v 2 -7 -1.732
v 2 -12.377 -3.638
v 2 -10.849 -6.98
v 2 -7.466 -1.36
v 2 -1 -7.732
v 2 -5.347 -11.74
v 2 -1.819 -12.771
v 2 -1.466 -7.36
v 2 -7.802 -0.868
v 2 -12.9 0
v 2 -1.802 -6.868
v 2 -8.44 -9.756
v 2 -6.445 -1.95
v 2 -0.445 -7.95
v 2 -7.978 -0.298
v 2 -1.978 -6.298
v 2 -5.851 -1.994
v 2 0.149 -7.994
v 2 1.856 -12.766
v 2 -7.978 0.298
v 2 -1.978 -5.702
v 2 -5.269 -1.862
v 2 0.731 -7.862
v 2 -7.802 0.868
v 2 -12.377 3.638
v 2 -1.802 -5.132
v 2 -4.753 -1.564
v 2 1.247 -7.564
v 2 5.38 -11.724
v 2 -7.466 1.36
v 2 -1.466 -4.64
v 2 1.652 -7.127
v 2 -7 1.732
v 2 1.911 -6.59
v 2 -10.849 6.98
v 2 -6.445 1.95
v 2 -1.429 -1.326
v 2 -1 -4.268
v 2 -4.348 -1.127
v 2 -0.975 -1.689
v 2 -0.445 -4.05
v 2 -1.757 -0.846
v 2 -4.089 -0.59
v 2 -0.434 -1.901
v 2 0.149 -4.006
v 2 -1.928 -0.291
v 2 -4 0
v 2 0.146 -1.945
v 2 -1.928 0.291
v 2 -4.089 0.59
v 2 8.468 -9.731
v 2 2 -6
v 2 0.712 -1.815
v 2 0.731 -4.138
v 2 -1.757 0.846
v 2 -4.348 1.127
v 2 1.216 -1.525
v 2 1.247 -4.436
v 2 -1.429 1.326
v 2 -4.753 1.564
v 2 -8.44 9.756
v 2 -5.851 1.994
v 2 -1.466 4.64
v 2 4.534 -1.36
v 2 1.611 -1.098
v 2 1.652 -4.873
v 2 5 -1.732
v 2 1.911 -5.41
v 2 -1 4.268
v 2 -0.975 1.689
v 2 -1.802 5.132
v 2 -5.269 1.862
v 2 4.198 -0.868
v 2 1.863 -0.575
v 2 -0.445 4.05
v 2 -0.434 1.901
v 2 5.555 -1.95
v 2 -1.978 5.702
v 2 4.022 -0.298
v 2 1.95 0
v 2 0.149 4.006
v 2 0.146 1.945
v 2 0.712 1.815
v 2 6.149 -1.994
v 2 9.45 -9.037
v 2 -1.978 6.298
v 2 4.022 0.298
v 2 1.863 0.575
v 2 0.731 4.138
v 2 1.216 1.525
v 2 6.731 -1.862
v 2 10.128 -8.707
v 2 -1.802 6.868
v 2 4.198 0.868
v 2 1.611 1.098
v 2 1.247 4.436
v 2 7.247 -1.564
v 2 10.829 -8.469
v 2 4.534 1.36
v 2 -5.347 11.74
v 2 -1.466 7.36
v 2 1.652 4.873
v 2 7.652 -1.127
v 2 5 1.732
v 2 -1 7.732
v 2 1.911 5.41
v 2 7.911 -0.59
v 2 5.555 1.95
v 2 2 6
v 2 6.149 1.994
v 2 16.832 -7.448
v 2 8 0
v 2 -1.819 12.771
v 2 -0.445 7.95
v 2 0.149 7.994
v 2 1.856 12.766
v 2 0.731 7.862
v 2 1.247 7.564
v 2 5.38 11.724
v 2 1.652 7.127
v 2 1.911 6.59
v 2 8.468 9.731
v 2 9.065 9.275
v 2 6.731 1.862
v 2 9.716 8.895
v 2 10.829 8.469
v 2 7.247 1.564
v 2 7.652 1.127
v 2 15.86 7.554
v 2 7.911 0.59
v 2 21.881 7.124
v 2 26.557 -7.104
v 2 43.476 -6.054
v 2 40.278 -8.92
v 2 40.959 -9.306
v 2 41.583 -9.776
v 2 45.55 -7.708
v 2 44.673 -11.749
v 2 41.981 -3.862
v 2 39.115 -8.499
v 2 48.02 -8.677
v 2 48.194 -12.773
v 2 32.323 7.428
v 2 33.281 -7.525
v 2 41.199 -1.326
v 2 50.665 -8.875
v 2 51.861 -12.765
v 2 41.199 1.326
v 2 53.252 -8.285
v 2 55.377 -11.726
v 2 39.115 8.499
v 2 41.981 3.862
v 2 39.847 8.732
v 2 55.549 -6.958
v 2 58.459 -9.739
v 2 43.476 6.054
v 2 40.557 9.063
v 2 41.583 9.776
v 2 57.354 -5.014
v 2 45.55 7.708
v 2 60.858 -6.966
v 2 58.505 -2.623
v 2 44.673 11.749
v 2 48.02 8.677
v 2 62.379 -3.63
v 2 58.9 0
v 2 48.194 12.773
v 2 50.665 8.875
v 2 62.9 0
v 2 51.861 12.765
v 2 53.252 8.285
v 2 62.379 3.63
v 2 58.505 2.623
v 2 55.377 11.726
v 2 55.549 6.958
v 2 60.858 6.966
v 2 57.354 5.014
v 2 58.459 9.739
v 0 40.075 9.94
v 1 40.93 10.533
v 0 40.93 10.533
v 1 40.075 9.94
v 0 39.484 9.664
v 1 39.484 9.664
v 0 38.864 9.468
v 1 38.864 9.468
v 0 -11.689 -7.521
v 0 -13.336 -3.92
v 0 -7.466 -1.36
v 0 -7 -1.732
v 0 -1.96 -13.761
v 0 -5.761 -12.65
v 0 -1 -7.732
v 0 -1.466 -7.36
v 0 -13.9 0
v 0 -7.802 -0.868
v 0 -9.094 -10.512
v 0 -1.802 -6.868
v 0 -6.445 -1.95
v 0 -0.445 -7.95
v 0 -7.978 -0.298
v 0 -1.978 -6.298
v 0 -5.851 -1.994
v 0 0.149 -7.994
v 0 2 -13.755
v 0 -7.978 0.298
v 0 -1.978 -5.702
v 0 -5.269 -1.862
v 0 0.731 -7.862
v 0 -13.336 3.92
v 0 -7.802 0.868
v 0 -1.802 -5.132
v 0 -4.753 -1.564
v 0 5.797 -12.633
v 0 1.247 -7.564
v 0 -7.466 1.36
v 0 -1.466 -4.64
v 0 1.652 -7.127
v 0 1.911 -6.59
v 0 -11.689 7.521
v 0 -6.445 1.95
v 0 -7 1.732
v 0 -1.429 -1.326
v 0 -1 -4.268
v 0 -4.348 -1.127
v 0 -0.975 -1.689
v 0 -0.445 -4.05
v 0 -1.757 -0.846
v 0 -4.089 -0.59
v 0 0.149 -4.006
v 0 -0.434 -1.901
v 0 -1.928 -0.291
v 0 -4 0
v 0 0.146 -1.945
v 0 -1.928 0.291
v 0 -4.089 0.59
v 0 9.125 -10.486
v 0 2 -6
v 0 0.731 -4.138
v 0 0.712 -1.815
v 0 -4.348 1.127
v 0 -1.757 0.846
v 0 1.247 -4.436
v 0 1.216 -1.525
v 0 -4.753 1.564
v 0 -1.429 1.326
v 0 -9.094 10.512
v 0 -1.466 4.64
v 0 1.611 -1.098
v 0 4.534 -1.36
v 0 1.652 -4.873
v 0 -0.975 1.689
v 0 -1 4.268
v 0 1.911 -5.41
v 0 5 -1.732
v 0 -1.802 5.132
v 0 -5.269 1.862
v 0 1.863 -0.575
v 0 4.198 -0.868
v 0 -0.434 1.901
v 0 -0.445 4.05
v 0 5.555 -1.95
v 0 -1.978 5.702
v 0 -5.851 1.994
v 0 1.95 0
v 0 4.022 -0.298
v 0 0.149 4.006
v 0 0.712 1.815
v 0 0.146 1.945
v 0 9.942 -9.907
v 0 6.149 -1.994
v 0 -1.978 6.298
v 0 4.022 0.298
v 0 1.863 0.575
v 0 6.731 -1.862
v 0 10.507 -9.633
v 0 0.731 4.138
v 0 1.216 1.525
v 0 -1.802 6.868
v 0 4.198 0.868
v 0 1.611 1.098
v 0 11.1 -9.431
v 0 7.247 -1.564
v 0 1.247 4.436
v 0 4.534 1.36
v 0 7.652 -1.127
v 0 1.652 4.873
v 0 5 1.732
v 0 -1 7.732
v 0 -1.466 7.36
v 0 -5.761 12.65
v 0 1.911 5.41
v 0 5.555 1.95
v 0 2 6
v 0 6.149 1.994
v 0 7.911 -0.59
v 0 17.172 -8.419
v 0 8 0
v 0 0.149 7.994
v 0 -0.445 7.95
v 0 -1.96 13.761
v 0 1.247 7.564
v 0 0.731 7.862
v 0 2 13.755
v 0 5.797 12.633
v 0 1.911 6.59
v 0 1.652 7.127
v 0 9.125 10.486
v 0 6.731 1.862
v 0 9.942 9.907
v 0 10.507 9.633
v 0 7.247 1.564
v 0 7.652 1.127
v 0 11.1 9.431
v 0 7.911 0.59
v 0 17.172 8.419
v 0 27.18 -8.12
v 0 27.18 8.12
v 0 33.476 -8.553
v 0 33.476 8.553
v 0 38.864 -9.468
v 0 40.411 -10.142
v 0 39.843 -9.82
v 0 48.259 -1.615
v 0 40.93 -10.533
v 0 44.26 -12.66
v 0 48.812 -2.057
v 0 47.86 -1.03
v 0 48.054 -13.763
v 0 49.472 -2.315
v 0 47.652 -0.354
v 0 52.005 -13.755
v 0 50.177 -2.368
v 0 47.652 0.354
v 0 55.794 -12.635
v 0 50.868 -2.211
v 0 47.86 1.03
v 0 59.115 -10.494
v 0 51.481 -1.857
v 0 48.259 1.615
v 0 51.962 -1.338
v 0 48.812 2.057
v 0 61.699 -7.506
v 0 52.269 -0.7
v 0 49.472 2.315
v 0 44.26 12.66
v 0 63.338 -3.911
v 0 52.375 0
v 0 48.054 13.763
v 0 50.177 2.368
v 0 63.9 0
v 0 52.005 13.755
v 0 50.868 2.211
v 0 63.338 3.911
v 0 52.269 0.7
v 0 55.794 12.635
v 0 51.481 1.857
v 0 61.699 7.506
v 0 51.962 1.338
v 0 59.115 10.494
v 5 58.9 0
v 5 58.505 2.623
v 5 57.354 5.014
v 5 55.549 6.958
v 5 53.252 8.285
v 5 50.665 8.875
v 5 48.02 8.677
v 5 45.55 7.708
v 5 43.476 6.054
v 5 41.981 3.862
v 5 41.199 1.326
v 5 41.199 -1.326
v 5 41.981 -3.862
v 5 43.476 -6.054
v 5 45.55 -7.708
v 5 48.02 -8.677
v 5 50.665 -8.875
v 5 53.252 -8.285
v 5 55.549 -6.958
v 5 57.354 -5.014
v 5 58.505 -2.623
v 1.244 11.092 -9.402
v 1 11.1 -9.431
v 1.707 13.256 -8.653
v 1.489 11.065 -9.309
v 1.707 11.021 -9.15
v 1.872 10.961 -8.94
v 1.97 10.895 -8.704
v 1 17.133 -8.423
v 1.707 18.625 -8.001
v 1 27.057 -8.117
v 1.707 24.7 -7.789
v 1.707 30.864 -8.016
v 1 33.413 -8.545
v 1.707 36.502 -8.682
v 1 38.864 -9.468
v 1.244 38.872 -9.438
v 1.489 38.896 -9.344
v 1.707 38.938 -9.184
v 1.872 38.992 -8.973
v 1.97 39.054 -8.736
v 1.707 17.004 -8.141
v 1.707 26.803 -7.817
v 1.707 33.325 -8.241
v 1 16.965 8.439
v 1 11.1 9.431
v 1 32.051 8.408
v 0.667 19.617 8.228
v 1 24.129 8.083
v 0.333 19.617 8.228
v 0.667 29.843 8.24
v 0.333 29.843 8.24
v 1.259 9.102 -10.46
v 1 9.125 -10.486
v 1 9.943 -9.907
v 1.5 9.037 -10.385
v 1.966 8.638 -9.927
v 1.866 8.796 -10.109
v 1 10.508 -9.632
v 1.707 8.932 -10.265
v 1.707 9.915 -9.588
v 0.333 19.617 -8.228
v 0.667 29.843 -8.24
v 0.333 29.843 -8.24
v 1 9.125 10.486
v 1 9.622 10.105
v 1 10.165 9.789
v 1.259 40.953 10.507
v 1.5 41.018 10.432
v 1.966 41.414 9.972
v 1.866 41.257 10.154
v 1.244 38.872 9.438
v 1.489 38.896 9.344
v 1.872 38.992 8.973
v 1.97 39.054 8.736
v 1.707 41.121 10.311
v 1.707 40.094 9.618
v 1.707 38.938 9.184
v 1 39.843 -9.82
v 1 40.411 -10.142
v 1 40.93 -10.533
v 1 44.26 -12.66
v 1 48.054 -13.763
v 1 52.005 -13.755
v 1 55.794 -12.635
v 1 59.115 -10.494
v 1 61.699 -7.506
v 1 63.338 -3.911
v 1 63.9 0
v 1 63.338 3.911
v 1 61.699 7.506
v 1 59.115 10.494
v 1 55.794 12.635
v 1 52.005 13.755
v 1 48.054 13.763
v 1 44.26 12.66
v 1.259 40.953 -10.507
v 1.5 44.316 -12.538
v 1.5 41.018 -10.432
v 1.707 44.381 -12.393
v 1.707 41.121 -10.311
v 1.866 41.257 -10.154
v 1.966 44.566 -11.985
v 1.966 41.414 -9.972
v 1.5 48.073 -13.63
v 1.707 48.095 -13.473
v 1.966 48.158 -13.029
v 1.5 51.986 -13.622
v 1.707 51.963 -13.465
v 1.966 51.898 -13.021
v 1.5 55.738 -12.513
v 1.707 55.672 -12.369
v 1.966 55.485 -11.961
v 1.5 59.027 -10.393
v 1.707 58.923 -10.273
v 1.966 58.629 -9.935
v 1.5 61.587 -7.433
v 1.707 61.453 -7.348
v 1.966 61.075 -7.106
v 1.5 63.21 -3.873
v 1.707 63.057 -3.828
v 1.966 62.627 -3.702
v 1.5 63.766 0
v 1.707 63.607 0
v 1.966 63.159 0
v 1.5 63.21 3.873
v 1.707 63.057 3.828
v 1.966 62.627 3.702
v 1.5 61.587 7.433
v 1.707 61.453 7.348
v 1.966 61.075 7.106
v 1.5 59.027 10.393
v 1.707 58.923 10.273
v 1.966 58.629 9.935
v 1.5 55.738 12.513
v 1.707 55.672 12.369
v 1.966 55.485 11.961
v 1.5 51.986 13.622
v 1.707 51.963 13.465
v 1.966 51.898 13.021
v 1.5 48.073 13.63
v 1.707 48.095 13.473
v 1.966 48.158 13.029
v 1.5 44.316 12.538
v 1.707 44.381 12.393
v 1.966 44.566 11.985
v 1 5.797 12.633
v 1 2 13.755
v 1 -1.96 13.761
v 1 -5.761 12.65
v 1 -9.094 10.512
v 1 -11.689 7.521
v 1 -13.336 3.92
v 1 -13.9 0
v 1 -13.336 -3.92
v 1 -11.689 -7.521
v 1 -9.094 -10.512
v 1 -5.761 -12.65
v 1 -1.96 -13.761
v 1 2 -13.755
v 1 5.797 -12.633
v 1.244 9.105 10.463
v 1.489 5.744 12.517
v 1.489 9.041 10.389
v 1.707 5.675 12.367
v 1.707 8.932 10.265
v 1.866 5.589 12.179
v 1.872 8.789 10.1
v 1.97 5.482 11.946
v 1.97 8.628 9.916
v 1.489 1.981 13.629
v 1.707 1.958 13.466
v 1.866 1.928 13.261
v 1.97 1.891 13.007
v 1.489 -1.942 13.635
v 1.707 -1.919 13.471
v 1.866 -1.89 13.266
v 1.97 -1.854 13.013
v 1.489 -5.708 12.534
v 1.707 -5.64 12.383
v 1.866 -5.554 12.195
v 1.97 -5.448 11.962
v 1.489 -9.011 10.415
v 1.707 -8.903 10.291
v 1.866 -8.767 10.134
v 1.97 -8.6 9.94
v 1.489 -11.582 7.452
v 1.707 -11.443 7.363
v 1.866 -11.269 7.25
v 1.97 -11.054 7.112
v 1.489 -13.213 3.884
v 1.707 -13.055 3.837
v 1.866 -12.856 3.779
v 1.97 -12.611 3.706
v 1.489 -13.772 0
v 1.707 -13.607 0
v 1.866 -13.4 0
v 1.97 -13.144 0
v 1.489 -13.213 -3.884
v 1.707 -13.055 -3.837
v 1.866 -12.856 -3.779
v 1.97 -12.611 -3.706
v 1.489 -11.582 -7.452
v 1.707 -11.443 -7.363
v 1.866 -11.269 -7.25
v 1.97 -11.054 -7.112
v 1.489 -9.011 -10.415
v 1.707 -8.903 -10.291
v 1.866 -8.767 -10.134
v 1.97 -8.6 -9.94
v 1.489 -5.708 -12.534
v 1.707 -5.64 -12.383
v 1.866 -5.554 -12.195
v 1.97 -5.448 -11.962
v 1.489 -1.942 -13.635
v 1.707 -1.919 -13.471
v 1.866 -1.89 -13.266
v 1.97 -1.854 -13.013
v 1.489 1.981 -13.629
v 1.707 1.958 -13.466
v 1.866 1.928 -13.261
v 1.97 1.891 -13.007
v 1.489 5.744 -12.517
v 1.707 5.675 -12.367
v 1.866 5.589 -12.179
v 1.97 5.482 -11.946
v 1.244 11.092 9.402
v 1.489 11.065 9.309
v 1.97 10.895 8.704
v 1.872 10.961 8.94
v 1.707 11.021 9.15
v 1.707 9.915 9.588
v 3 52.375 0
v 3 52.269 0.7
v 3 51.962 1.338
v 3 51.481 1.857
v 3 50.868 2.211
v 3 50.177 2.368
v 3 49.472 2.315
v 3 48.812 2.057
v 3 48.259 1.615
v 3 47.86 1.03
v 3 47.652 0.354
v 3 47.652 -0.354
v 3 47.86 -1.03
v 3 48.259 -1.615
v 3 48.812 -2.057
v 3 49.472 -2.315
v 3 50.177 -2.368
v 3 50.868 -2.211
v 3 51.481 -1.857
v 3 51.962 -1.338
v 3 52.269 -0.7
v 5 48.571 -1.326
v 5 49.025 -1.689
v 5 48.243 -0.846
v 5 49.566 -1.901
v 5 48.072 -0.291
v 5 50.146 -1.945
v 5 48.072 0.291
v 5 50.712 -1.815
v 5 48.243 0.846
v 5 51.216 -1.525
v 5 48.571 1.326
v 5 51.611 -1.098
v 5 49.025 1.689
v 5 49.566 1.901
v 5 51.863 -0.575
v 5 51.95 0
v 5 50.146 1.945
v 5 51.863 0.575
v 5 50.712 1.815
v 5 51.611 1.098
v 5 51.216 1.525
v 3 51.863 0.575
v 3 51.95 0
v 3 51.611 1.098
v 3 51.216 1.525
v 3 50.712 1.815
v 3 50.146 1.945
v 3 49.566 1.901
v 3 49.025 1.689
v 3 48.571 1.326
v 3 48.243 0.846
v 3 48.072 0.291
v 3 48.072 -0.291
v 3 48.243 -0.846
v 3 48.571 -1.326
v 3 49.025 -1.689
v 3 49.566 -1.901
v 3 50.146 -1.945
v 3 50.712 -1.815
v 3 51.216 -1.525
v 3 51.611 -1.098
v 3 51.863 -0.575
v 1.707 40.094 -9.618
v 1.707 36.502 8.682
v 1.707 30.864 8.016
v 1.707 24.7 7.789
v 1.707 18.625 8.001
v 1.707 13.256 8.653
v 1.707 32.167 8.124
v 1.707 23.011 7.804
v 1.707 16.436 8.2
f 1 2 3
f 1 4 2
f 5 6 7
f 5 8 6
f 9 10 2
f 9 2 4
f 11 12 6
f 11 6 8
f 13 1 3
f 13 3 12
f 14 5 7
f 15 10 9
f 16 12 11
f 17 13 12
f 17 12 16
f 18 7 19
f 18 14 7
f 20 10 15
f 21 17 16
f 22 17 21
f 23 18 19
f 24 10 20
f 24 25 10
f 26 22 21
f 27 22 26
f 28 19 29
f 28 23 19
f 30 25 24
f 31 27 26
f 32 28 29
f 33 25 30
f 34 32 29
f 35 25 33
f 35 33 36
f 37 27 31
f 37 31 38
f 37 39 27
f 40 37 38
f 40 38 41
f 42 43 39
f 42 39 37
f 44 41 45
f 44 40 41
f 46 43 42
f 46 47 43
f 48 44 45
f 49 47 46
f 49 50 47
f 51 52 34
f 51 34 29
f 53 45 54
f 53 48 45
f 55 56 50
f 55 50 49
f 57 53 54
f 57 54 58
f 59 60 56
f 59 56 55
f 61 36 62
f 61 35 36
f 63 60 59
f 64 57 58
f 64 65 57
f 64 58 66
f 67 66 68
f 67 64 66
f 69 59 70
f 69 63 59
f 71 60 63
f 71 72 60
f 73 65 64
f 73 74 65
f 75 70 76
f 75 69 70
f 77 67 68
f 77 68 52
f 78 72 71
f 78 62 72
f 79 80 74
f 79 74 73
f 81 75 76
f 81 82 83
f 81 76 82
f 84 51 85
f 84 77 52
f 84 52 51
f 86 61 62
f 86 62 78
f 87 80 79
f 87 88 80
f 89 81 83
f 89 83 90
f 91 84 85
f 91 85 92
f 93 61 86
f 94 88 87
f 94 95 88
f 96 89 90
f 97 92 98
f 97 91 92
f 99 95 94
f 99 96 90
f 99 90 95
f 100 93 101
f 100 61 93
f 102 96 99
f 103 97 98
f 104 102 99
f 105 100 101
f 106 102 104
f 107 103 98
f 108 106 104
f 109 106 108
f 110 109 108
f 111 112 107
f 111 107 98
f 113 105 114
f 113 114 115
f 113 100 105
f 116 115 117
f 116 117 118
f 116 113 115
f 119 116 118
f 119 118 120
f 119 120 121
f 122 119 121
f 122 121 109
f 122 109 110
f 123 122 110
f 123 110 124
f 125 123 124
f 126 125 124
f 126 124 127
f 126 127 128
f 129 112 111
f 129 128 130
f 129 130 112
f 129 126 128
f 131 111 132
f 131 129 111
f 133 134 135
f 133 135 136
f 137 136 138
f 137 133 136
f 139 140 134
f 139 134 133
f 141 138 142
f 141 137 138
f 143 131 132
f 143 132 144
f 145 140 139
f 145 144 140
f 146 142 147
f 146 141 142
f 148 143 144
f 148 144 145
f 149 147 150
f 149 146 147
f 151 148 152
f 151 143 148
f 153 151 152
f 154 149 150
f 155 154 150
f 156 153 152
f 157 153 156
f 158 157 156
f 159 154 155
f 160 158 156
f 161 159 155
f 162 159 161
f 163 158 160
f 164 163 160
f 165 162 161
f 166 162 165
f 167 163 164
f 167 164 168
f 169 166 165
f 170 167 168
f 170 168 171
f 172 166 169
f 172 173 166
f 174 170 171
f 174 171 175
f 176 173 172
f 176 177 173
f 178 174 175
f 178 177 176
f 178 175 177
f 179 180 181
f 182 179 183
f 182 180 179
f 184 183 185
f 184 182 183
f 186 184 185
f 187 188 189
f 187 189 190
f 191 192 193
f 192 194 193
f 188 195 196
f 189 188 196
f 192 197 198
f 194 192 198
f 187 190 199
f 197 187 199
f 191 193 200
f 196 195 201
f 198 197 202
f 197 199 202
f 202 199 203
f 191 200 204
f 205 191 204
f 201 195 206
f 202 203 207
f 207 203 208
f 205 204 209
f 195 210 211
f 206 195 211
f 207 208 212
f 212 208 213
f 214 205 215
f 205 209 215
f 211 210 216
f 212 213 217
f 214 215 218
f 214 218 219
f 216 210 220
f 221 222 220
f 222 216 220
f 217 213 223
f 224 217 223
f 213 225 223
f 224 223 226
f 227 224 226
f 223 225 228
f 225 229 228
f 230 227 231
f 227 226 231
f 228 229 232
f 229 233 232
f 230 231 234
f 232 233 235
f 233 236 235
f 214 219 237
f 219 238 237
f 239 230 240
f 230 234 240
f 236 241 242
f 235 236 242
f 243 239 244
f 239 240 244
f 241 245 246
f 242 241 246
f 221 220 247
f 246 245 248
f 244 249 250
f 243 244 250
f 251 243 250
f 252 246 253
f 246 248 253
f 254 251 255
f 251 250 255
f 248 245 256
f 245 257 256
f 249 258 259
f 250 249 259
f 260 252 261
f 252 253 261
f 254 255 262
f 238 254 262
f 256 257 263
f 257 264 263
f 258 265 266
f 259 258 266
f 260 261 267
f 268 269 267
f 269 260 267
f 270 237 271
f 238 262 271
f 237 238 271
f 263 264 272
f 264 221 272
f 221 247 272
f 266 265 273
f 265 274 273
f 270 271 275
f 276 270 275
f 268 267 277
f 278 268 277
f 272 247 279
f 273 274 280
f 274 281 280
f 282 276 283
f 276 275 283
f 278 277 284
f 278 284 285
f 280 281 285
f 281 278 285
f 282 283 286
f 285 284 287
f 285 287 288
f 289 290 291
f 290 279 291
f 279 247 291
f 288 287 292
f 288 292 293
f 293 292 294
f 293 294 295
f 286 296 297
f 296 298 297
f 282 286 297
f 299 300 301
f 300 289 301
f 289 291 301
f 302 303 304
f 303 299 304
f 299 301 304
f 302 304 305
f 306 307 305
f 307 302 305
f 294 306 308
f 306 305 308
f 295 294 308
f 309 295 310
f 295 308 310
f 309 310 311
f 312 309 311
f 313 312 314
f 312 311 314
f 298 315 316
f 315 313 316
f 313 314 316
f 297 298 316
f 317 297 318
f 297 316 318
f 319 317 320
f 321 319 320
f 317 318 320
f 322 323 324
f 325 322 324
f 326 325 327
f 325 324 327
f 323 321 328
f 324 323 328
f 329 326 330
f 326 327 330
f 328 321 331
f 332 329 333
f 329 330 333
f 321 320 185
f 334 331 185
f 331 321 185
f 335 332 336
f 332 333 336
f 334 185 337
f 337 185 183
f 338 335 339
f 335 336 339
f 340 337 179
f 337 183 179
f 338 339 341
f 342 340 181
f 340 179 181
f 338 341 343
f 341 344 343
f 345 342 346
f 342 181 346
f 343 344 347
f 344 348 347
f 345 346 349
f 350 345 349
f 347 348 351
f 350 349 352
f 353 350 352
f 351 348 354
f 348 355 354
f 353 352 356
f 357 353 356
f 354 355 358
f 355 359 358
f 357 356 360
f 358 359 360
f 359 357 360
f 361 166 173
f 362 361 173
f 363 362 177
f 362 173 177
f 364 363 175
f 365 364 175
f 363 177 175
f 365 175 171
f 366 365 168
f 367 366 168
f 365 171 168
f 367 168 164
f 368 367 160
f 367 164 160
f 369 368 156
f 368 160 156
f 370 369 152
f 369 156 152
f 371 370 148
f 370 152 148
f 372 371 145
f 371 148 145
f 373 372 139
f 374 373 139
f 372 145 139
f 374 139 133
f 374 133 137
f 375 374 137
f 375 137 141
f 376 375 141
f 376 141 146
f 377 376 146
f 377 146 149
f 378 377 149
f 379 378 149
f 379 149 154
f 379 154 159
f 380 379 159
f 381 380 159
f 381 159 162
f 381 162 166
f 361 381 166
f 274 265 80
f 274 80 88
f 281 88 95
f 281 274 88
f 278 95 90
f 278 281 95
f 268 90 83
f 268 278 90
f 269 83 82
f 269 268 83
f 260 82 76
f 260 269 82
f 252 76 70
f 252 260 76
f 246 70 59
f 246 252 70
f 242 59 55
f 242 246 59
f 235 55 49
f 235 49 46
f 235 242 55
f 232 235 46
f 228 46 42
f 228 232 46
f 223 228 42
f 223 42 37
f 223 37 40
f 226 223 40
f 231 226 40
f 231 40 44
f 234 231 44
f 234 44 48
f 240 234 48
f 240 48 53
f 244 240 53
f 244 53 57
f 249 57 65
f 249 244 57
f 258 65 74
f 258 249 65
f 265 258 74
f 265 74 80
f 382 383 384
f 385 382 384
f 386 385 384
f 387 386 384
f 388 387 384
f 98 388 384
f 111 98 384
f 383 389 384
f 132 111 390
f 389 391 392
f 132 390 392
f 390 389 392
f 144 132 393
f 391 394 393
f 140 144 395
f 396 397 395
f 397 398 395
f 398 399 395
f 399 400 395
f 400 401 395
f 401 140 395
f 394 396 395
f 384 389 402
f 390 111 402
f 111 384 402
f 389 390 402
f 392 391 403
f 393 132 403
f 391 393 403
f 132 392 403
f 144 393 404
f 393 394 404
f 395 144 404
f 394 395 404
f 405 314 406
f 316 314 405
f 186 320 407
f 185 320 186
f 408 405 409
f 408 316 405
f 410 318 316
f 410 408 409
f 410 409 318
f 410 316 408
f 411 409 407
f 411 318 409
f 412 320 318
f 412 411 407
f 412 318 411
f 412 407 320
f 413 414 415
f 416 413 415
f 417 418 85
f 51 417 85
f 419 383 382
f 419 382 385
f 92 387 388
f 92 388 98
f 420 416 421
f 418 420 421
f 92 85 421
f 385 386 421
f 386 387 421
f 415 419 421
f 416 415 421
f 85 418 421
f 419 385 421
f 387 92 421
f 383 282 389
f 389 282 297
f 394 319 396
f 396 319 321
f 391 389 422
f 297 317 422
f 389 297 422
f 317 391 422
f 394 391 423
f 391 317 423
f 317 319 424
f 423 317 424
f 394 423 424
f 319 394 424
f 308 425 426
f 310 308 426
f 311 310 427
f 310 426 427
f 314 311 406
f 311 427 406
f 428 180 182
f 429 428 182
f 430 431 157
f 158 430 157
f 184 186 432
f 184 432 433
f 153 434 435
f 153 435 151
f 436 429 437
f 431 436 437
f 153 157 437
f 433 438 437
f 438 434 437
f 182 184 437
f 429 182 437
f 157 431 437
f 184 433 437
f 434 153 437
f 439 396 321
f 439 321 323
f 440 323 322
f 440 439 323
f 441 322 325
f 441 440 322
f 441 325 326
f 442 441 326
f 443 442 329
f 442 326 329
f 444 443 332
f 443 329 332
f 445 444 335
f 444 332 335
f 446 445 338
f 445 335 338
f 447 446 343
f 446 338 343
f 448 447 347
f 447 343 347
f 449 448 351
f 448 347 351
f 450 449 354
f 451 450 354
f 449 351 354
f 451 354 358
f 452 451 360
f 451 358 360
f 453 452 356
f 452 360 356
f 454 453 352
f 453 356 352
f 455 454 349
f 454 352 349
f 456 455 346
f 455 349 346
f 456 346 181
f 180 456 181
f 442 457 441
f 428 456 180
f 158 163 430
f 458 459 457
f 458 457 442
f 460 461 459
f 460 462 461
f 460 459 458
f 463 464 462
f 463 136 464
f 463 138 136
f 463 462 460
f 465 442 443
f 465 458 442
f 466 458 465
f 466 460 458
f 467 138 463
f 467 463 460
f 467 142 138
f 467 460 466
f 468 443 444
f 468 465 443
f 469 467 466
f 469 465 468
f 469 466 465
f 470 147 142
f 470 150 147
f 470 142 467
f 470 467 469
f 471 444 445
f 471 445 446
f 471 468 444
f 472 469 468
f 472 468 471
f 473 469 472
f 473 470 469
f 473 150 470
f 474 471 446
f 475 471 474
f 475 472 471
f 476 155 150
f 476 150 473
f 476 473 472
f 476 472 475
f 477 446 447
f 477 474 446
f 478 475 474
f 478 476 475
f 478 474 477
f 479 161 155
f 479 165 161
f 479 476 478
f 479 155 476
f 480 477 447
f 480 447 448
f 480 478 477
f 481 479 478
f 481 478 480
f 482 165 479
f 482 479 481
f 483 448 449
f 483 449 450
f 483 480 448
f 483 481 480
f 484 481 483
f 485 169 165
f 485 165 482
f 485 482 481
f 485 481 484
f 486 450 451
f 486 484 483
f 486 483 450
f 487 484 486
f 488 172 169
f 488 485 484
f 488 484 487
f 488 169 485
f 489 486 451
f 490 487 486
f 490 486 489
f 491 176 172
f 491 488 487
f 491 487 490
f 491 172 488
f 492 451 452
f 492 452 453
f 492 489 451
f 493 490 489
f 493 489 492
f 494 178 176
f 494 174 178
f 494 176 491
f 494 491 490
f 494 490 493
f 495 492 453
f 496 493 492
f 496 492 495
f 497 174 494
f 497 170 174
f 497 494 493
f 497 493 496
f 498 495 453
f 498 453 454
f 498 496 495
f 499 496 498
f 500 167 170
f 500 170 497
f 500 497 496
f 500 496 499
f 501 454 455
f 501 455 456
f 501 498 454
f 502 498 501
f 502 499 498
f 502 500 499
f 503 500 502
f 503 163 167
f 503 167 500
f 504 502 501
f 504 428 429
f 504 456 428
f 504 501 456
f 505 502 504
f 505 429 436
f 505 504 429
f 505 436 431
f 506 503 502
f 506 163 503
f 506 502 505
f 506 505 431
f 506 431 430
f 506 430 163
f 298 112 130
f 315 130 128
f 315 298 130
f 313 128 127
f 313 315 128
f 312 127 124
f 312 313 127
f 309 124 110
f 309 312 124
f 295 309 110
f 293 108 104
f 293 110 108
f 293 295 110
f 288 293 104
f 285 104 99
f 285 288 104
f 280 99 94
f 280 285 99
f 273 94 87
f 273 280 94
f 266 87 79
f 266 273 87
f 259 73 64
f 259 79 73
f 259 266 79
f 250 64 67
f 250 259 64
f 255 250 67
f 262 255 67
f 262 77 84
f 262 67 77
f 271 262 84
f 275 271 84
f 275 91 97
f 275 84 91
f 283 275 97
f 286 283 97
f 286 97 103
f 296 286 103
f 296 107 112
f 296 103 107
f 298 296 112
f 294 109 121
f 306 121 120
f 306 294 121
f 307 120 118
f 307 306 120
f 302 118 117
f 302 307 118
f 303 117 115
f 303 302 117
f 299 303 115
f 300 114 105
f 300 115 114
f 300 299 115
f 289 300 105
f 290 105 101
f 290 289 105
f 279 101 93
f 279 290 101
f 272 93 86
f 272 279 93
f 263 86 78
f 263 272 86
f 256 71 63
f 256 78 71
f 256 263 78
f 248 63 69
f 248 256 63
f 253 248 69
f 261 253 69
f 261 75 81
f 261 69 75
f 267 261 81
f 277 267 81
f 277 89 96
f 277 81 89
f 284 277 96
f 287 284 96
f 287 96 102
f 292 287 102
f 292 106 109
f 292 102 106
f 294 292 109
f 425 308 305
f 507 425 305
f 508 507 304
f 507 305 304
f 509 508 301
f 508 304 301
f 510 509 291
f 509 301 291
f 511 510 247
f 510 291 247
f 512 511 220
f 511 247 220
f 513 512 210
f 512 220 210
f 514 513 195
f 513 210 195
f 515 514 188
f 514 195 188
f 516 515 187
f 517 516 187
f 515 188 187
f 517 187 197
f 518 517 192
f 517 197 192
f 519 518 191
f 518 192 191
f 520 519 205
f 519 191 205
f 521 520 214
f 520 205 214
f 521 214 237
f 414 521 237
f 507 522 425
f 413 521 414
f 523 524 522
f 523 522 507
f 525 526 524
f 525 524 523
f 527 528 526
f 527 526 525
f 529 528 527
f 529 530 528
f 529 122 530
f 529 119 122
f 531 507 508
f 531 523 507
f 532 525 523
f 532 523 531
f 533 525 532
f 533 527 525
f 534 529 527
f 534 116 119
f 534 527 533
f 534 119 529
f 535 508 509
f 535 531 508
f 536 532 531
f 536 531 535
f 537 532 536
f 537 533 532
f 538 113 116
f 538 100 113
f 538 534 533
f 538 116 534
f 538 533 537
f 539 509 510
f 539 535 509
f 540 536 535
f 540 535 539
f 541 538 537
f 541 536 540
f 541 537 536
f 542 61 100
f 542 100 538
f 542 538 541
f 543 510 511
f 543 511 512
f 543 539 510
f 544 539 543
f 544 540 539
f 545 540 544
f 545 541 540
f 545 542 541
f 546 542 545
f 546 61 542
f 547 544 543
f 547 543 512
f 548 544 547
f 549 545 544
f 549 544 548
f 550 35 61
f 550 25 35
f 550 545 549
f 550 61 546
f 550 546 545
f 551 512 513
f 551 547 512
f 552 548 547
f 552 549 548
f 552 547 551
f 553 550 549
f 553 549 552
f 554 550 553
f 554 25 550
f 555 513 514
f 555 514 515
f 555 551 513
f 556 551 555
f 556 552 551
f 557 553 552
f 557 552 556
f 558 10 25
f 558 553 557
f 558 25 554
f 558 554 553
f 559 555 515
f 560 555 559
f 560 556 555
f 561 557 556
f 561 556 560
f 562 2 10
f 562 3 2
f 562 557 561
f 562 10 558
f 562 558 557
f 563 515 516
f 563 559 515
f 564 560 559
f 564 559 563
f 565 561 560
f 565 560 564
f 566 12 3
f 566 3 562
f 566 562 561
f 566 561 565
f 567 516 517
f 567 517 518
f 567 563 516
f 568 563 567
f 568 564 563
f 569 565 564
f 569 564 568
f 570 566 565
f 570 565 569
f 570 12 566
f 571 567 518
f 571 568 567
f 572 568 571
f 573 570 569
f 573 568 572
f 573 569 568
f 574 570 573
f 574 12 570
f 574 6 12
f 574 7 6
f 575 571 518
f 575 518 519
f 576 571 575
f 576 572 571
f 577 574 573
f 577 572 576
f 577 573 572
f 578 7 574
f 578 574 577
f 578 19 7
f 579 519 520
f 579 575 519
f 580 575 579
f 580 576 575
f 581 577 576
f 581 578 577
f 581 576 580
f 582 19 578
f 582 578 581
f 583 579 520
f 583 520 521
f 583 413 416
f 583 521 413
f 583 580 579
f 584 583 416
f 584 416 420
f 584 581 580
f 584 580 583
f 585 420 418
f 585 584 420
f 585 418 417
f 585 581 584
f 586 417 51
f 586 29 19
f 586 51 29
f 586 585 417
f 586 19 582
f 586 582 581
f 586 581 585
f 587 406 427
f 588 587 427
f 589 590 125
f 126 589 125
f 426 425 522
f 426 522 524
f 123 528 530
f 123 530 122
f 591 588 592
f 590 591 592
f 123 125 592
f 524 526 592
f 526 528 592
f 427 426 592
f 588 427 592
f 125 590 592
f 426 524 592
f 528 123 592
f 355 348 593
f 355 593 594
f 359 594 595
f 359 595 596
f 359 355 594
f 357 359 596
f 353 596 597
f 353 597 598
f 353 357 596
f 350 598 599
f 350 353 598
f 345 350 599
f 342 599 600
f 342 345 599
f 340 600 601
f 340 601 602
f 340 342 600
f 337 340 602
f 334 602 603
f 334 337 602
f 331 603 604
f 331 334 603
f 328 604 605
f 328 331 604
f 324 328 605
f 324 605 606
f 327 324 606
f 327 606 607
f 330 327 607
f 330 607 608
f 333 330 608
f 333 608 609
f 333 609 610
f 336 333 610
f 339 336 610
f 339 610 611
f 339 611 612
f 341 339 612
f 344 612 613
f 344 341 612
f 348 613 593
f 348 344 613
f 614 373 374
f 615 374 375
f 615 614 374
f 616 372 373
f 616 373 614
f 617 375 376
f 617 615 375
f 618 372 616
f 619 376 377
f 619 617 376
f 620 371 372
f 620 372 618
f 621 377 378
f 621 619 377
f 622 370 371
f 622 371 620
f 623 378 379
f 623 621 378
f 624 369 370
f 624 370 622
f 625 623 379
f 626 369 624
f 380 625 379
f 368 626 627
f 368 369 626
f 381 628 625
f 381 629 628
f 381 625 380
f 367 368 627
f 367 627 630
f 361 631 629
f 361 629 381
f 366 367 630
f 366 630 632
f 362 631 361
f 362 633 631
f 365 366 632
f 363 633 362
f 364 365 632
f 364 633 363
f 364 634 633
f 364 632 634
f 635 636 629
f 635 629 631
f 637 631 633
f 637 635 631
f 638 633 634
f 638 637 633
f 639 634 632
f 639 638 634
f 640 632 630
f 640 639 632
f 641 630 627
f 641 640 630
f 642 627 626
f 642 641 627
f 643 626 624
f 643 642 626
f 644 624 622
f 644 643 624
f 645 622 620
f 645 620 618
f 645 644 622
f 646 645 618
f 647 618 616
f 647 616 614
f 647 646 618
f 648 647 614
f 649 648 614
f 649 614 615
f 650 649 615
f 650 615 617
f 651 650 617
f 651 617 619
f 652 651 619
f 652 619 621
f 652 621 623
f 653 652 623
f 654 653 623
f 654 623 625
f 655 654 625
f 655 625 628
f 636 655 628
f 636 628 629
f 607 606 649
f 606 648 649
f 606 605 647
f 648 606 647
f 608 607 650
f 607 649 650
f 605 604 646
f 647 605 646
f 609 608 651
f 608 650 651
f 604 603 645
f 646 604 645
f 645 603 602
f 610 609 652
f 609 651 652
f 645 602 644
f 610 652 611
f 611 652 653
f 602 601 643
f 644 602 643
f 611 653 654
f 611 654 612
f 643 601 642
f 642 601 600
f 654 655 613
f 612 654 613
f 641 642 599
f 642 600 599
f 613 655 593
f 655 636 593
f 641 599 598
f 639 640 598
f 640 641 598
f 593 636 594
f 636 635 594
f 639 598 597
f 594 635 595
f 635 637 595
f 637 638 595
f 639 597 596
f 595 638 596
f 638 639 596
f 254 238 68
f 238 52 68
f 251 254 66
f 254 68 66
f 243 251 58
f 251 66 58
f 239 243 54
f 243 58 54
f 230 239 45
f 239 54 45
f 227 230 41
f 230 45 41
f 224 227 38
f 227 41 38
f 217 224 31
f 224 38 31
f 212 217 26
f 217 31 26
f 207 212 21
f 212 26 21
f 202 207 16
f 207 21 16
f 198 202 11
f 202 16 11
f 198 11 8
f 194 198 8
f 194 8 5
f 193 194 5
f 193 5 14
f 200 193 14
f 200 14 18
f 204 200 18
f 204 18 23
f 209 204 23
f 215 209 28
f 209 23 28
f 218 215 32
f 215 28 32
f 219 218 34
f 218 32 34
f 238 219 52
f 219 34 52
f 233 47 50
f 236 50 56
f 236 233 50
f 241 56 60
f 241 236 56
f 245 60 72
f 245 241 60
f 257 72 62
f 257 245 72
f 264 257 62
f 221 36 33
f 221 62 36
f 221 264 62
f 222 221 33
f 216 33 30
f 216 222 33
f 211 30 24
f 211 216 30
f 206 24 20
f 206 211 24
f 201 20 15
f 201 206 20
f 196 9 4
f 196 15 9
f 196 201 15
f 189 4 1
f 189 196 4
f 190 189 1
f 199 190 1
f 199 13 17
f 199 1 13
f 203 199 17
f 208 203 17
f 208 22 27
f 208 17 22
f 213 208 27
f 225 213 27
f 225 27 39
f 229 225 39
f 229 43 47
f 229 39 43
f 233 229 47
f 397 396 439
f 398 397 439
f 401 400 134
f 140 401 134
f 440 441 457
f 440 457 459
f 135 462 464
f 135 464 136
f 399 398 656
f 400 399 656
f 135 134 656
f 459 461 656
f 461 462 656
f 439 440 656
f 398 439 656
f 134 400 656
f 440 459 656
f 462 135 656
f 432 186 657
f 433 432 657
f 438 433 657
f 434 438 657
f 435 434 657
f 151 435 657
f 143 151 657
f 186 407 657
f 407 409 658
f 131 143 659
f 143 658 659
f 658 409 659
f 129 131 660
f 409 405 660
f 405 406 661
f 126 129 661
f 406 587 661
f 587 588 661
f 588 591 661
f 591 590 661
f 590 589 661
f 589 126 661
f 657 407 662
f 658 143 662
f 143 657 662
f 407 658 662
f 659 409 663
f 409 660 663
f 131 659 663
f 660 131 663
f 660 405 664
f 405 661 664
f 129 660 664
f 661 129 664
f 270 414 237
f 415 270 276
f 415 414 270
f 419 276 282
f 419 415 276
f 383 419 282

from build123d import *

# Parameters (mm, degrees)
F0_R     = 8.9
F0_R_2   = 2.375
F0_R_3   = 1.95
F1_DEPTH = 5
F2_DEPTH = 2
F3_DEPTH = 2
F4_R     = 5
F5_R     = 1
F6_R     = 2
F7_DEPTH = 12.5
F8_DEPTH = 3


with BuildPart() as f1:
    # F0 (on Right) → F1 (new body)
    with BuildSketch(Plane.YZ):
        with Locations((50, 0)):
            Circle(F0_R)
        with Locations((50, 0)):
            Circle(F0_R_2, mode=Mode.SUBTRACT)
        with Locations((50, 0)):
            Circle(F0_R_2)
        with Locations((50, 0)):
            Circle(F0_R_3, mode=Mode.SUBTRACT)
    extrude(amount=F1_DEPTH)

    # F0 (on Right) → F2 (join)
    with BuildSketch(Plane.YZ):
        with BuildLine():
            ThreePointArc((9.8287842585, -9.8287842585), (12.8419255019, -5.3192997099), (13.9, 0))
            ThreePointArc((13.9, 0), (12.8419255019, 5.3192997099), (9.8287842585, 9.8287842585))
            ThreePointArc((9.8287842585, 9.8287842585), (-13.9, 0), (9.8287842585, -9.8287842585))
        make_face()
        Circle(F0_R, mode=Mode.SUBTRACT)
        with BuildLine():
            ThreePointArc((9.8287842585, 9.8287842585), (12.8419255019, 5.3192997099), (13.9, 0))
            ThreePointArc((13.9, 0), (12.8419255019, -5.3192997099), (9.8287842585, -9.8287842585))
            add(Edge.make_bspline(
                [(9.8287842585, -9.8287842585), (16.2461867133, -7.50000003), (32.6766982829, -7.5000000581), (40.1712157415, -9.8287842585)],
                knots=[0, 0, 0, 0, 30.342431483, 30.342431483, 30.342431483, 30.342431483], degree=3))
            ThreePointArc((40.1712157415, -9.8287842585), (36.1, 0), (40.1712157415, 9.8287842585))
            add(Edge.make_bspline(
                [(9.8287842585, 9.8287842585), (16.2461867454, 7.49999997), (32.6766983239, 7.4999999419), (40.1712157415, 9.8287842585)],
                knots=[0, 0, 0, 0, 30.342431483, 30.342431483, 30.342431483, 30.342431483], degree=3))
        make_face()
        with BuildLine():
            ThreePointArc((63.9, 0), (55.3192997099, 12.8419255019), (40.1712157415, 9.8287842585))
            ThreePointArc((40.1712157415, 9.8287842585), (36.1, 0), (40.1712157415, -9.8287842585))
            ThreePointArc((40.1712157415, -9.8287842585), (55.3192997099, -12.8419255019), (63.9, 0))
        make_face()
        with Locations((50, 0)):
            Circle(F0_R, mode=Mode.SUBTRACT)
    extrude(amount=F2_DEPTH)

    # F0 (on Right) → F3 (join)
    with BuildSketch(Plane.YZ):
        Circle(F0_R)
        Circle(F0_R_2, mode=Mode.SUBTRACT)
        Circle(F0_R_2)
        Circle(F0_R_3, mode=Mode.SUBTRACT)
    extrude(amount=F3_DEPTH)

    # F4
    f4_edges = [f1.edges().sort_by_distance(p)[0] for p in [
        (1, 9.828784, 9.828784),
        (1, 40.171216, 9.828784),
        (1, 9.828784, -9.828784),
        (1, 40.171216, -9.828784),
    ]]
    fillet(f4_edges, radius=F4_R)

    # F5
    f5_edges = [f1.edges().sort_by_distance(p)[0] for p in [
        (2, 63.9, 0),
        (2, 24.980578, 8.083035),
        (2, -13.9, 0),
        (2, 24.980578, -8.083035),
    ]]
    fillet(f5_edges, radius=F5_R)

    # F6 (on Right) → F7 (cut, symmetric)
    with BuildSketch(Plane.YZ):
        with Locations((6, 0)):
            Circle(F6_R)
        with Locations((-6, 0)):
            Circle(F6_R)
        with Locations((0, 6)):
            Circle(F6_R)
        with Locations((0, -6)):
            Circle(F6_R)
    extrude(amount=F7_DEPTH, both=True, mode=Mode.SUBTRACT)

    # F0 (on Right) → F8 (cut)
    with BuildSketch(Plane.YZ):
        with Locations((50, 0)):
            Circle(F0_R_2)
        with Locations((50, 0)):
            Circle(F0_R_3, mode=Mode.SUBTRACT)
    extrude(amount=F8_DEPTH, mode=Mode.SUBTRACT)


solid = f1.part
